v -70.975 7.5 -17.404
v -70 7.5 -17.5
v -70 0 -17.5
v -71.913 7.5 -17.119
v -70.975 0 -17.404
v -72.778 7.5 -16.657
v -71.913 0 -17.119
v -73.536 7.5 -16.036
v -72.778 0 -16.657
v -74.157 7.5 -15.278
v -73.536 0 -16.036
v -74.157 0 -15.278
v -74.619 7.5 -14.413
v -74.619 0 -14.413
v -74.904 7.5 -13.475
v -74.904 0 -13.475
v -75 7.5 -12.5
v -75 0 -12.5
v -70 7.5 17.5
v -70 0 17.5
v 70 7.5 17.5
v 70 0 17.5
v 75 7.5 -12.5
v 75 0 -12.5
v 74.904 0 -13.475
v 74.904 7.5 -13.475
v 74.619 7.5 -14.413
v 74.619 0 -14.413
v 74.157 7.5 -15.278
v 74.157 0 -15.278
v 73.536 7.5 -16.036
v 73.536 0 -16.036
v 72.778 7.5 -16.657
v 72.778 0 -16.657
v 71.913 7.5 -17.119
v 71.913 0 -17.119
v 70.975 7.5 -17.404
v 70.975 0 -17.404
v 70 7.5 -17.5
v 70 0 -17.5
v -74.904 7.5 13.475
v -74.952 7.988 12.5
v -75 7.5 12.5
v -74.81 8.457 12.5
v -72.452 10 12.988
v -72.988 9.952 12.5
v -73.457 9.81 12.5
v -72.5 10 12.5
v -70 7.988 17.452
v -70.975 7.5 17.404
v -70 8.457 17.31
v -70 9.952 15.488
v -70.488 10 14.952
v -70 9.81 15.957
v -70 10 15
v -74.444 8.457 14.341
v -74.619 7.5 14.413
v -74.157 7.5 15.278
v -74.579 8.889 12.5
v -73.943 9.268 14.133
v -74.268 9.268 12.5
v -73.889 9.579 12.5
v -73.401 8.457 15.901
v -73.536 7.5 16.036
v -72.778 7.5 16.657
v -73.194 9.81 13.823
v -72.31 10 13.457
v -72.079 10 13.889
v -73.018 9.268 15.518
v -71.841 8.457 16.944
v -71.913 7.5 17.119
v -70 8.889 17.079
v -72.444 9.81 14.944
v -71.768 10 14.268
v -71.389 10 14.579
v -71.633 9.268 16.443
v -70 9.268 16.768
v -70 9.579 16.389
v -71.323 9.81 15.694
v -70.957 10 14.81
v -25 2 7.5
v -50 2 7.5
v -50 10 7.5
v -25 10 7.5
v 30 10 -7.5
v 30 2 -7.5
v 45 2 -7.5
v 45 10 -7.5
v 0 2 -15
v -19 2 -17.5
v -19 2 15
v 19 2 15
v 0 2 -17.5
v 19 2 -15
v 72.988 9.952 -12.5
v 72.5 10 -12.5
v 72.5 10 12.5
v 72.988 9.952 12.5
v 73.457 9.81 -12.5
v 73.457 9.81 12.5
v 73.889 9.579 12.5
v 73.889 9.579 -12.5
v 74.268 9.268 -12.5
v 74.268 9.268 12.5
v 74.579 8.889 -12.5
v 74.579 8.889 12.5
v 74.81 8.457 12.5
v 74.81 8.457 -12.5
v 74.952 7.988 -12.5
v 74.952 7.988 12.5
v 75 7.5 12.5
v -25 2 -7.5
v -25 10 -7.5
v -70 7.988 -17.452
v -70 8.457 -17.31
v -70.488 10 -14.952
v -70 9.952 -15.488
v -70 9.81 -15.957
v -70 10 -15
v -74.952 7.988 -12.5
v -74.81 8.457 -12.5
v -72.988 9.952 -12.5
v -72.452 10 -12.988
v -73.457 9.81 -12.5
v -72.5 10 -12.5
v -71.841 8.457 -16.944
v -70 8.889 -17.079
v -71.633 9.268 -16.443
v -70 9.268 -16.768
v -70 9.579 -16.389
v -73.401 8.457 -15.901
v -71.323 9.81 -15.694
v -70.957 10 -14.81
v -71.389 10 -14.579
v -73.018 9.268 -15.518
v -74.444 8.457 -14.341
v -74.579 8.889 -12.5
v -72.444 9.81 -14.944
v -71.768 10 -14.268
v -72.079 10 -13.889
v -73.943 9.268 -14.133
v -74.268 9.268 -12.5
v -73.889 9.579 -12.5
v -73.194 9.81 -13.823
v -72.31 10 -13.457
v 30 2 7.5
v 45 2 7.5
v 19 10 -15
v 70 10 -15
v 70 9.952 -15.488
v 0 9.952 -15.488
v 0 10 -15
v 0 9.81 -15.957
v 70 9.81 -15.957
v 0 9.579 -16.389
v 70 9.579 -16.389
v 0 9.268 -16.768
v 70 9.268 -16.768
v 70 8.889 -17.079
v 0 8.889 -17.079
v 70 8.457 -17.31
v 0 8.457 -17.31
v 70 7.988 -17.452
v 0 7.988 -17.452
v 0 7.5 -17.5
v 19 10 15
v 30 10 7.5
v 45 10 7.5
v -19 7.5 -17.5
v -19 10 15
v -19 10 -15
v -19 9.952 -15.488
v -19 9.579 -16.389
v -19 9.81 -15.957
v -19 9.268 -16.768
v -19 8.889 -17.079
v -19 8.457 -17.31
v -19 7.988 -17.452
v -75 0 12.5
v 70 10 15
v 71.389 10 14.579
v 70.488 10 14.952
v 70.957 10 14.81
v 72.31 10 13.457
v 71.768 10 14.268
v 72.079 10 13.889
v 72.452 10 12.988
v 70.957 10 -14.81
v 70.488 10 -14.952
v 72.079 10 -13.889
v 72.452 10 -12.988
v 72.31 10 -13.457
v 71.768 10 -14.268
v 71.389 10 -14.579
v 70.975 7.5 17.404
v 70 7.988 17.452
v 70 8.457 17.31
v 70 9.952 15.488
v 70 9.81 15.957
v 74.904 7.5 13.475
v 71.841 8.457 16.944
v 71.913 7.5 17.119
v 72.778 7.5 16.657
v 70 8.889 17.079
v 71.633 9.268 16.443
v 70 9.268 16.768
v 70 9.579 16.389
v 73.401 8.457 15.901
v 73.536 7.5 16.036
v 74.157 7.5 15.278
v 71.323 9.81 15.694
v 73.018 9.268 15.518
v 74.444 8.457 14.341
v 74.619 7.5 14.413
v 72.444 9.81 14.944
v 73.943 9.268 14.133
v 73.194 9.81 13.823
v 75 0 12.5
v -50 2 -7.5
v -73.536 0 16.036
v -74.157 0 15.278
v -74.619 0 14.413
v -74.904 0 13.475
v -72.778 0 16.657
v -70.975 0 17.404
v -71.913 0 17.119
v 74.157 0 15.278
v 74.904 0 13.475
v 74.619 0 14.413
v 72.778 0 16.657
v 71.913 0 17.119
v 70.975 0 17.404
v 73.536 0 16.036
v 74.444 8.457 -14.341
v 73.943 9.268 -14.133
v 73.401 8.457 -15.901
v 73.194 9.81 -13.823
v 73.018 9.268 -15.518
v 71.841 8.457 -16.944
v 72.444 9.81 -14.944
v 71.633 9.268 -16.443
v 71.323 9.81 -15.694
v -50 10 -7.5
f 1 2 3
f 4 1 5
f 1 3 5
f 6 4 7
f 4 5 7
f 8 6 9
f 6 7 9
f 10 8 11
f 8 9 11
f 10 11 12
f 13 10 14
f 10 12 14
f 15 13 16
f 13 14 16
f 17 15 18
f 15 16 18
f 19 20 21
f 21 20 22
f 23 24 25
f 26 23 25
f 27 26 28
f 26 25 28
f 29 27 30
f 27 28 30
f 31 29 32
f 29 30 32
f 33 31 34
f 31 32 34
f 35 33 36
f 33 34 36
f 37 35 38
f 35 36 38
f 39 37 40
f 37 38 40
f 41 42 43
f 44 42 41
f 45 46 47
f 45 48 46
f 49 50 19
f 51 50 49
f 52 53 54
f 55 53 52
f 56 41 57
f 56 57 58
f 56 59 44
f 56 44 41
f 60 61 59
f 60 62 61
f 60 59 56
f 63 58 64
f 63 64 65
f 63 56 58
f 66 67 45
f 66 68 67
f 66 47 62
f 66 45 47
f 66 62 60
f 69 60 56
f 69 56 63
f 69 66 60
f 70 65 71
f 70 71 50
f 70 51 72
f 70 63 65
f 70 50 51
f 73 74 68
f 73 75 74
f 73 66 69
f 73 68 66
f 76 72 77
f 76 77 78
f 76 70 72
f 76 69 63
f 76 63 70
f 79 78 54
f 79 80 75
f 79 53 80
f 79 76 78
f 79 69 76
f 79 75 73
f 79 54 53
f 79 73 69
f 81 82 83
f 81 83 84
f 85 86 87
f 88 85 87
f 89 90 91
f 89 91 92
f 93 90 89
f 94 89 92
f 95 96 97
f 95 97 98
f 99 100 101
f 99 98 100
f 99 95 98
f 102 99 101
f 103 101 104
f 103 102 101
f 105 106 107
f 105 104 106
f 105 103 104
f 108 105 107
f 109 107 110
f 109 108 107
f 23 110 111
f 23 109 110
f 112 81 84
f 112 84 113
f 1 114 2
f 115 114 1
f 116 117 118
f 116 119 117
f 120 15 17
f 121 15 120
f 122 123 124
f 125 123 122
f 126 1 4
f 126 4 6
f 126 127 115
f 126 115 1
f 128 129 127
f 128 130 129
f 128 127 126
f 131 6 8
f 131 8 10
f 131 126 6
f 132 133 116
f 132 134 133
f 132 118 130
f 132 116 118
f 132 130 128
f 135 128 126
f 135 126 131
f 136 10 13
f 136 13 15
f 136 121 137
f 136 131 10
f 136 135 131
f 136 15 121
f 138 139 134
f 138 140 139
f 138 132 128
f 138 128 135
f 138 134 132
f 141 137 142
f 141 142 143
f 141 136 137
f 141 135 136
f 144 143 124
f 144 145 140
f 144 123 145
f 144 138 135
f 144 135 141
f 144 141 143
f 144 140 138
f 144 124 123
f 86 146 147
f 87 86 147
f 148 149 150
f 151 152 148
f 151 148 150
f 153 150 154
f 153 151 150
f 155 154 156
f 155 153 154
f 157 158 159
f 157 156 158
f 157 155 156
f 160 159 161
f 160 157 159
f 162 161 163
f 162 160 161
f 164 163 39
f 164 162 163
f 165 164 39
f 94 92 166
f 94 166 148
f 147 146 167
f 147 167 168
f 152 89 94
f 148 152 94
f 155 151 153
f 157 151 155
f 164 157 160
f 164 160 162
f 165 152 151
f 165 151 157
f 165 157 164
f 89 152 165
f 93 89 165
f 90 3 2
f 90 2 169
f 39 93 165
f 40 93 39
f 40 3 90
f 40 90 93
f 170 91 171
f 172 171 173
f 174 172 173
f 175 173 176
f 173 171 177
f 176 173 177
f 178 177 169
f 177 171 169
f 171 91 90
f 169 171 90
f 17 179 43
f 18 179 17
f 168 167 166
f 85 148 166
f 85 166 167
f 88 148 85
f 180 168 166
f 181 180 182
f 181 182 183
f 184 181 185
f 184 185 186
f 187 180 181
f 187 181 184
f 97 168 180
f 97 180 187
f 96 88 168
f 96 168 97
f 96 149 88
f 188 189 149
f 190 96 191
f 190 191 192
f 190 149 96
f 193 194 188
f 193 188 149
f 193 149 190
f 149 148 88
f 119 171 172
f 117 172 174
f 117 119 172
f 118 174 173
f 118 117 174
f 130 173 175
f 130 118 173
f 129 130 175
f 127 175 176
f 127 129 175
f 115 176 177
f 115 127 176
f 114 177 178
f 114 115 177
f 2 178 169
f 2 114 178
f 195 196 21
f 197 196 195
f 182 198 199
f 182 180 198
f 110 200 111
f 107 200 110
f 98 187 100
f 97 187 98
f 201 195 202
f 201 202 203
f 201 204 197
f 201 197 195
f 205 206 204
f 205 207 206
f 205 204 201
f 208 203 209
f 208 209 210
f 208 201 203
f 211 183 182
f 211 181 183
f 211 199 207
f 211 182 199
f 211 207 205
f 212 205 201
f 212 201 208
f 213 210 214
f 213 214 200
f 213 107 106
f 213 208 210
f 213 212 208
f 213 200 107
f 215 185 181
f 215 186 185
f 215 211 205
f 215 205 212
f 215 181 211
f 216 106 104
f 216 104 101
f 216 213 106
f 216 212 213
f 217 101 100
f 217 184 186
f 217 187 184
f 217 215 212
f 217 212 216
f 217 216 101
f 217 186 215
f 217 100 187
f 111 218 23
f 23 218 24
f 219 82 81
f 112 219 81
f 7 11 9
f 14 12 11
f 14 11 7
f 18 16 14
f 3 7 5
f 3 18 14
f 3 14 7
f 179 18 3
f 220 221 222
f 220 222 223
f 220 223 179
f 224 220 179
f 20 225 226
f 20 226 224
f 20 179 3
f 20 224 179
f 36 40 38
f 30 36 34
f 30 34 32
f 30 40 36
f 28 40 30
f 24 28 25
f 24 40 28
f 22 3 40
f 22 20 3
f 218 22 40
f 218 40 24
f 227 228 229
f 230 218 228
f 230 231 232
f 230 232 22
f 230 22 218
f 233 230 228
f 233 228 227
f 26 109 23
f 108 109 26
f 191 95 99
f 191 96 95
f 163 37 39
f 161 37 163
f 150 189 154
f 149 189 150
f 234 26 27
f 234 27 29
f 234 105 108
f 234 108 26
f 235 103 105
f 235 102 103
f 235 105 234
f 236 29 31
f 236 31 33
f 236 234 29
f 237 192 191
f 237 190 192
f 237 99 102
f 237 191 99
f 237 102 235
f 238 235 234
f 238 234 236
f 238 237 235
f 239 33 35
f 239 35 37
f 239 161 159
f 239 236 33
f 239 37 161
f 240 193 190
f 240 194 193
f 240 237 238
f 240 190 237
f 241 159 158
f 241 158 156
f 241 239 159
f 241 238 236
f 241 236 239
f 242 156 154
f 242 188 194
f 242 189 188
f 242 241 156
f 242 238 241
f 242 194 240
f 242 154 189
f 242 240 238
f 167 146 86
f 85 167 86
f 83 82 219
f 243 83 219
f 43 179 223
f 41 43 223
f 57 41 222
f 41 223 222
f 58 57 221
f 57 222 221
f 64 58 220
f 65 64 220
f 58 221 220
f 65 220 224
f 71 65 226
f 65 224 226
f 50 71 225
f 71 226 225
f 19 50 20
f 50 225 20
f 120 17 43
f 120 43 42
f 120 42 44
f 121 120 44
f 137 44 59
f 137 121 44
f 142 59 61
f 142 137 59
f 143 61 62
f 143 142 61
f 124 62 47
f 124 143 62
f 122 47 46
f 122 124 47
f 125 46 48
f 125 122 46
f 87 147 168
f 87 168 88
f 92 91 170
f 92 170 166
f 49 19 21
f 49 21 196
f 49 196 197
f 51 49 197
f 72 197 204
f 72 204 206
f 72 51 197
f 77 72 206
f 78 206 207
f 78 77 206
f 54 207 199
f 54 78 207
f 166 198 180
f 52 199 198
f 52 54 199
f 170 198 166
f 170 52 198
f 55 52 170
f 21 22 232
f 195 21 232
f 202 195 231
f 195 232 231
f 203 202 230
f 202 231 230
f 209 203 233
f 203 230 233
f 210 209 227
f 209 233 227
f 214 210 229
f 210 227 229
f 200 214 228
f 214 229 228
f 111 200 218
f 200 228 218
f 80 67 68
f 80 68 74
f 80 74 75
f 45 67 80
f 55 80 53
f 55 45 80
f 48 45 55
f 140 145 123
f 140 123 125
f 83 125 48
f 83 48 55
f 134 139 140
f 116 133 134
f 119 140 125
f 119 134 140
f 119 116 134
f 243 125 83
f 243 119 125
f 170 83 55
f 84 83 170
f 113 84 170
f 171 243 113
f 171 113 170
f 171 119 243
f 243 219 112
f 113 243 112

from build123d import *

# Parameters (mm, degrees)
SKETCH1_W           = 150
SKETCH1_H           = 35
SKETCH1_W_2         = 38
SKETCH1_H_2         = 30
SKETCH1_W_3         = 25
SKETCH1_H_3         = 15
SKETCH1_W_4         = 15
BOSS_EXTRUDE1_DEPTH = 10
SKETCH2_W           = 25
SKETCH2_H           = 15
SKETCH2_W_2         = 38
SKETCH2_H_2         = 30
SKETCH2_W_3         = 15
BOSS_EXTRUDE2_DEPTH = 2
SKETCH3_W           = 19
SKETCH3_H           = 2.5
CUT_EXTRUDE3_DEPTH  = 8
FILLET1_START       = -75
FILLET1_DEPTH       = 150
FILLET1_START_2     = -18
FILLET1_2_DEPTH     = 36
FILLET2_R           = 5


with BuildPart() as part:
    # Sketch1 → Boss-Extrude1 (new body)
    with BuildSketch(Plane(origin=(0, 0, 0), x_dir=(1, 0, 0), z_dir=(0, 1, 0))):
        Rectangle(SKETCH1_W, SKETCH1_H)
        Rectangle(SKETCH1_W_2, SKETCH1_H_2, mode=Mode.SUBTRACT)
        with Locations((-37.5, 0)):
            Rectangle(SKETCH1_W_3, SKETCH1_H_3, mode=Mode.SUBTRACT)
        with Locations((37.5, 0)):
            Rectangle(SKETCH1_W_4, SKETCH1_H_3, mode=Mode.SUBTRACT)
    extrude(amount=BOSS_EXTRUDE1_DEPTH)

    # Sketch2 → Boss-Extrude2 (add)
    with BuildSketch(Plane.XZ):
        with Locations((-37.5, 0)):
            Rectangle(SKETCH2_W, SKETCH2_H)
        Rectangle(SKETCH2_W_2, SKETCH2_H_2)
        with Locations((37.5, 0)):
            Rectangle(SKETCH2_W_3, SKETCH2_H)
    extrude(amount=-BOSS_EXTRUDE2_DEPTH)

    # Sketch3 → Cut-Extrude3 (cut)
    with BuildSketch(Plane(origin=(0, 2, 0), x_dir=(1, 0, 0), z_dir=(0, 1, 0))):
        with Locations((-9.5, 16.25)):
            Rectangle(SKETCH3_W, SKETCH3_H)
    extrude(amount=CUT_EXTRUDE3_DEPTH, mode=Mode.SUBTRACT)

    # Fillet1: read off the stored shape, not the designer's step
    # Fillet1 outline → Fillet1 (cut)
    with BuildSketch(Plane.YZ.offset(FILLET1_START)):
        with BuildLine():
            Line((10, -17.5), (10, -15))
            ThreePointArc((10, -15), (9.267766953, -16.767766953), (7.5, -17.5))
            Line((7.5, -17.5), (10, -17.5))
        make_face()
        with BuildLine():
            ThreePointArc((7.5, 17.5), (9.267766953, 16.767766953), (10, 15))
            Line((10, 15), (10, 17.5))
            Line((10, 17.5), (7.5, 17.5))
        make_face()
    extrude(amount=FILLET1_DEPTH, mode=Mode.SUBTRACT)

    # Fillet1 2 outline → Fillet1 2 (cut)
    with BuildSketch(Plane.XY.offset(FILLET1_START_2)):
        with BuildLine():
            Line((75, 10), (72.5, 10))
            ThreePointArc((72.5, 10), (74.267766953, 9.267766953), (75, 7.5))
            Line((75, 7.5), (75, 10))
        make_face()
        with BuildLine():
            ThreePointArc((-75, 7.5), (-74.267766953, 9.267766953), (-72.5, 10))
            Line((-72.5, 10), (-75, 10))
            Line((-75, 10), (-75, 7.5))
        make_face()
    extrude(amount=FILLET1_2_DEPTH, mode=Mode.SUBTRACT)

    # Fillet2
    # the kernel refuses this fillet: 5 mm, written as the material it takes off along each edge
    with BuildSketch(Plane(origin=(70, 10, -12.5), x_dir=(1, 0, 0), z_dir=(0, 0, 1))) as fillet2_piece_1:
        with BuildLine():
            CenterArc((2.5, -2.5), 2.5, 0, 90)
            Line((5, -2.5), (5, 0))
            Line((5, 0), (2.5, 0))
        make_face()
    revolve(axis=Axis((70, 10, -12.5), (0, 1, 0)), revolution_arc=90, mode=Mode.SUBTRACT)
    with BuildSketch(Plane(origin=(70, 10, 12.5), x_dir=(0, 0, 1), z_dir=(-1, 0, 0))) as fillet2_piece_2:
        with BuildLine():
            CenterArc((2.5, -2.5), 2.5, 0, 90)
            Line((5, -2.5), (5, 0))
            Line((5, 0), (2.5, 0))
        make_face()
    revolve(axis=Axis((70, 10, 12.5), (0, 1, 0)), revolution_arc=90, mode=Mode.SUBTRACT)
    with BuildSketch(Plane(origin=(-70, 10, -12.5), x_dir=(0, 0, -1), z_dir=(1, 0, 0))) as fillet2_piece_3:
        with BuildLine():
            CenterArc((2.5, -2.5), 2.5, 0, 90)
            Line((5, -2.5), (5, 0))
            Line((5, 0), (2.5, 0))
        make_face()
    revolve(axis=Axis((-70, 10, -12.5), (0, 1, 0)), revolution_arc=90, mode=Mode.SUBTRACT)
    with BuildSketch(Plane(origin=(-70, 10, 12.5), x_dir=(-1, 0, 0), z_dir=(0, 0, -1))) as fillet2_piece_4:
        with BuildLine():
            CenterArc((2.5, -2.5), 2.5, 0, 90)
            Line((5, -2.5), (5, 0))
            Line((5, 0), (2.5, 0))
        make_face()
    revolve(axis=Axis((-70, 10, 12.5), (0, 1, 0)), revolution_arc=90, mode=Mode.SUBTRACT)
    with BuildSketch(Plane(origin=(-75, -12.5, 17.5), x_dir=(1, 0, 0), z_dir=(0, 1, 0)), Plane(origin=(-75, -12.5, -17.5), x_dir=(0, 0, 1), z_dir=(0, 1, 0))) as fillet2_piece_5:
        with BuildLine():
            CenterArc((FILLET2_R, FILLET2_R), FILLET2_R, 180, 90)
            Line((0, FILLET2_R), (0, 0))
            Line((0, 0), (FILLET2_R, 0))
        make_face()
    extrude(amount=22.5, mode=Mode.SUBTRACT)
    with BuildSketch(Plane(origin=(75, -12.5, -17.5), x_dir=(0, 0, 1), z_dir=(0, 1, 0)), Plane(origin=(75, -12.5, 17.5), x_dir=(-1, 0, 0), z_dir=(0, 1, 0))) as fillet2_piece_6:
        with BuildLine():
            CenterArc((FILLET2_R, -FILLET2_R), FILLET2_R, 90, 90)
            Line((0, -FILLET2_R), (0, 0))
            Line((0, 0), (FILLET2_R, 0))
        make_face()
    extrude(amount=22.5, mode=Mode.SUBTRACT)


solid = part.part
